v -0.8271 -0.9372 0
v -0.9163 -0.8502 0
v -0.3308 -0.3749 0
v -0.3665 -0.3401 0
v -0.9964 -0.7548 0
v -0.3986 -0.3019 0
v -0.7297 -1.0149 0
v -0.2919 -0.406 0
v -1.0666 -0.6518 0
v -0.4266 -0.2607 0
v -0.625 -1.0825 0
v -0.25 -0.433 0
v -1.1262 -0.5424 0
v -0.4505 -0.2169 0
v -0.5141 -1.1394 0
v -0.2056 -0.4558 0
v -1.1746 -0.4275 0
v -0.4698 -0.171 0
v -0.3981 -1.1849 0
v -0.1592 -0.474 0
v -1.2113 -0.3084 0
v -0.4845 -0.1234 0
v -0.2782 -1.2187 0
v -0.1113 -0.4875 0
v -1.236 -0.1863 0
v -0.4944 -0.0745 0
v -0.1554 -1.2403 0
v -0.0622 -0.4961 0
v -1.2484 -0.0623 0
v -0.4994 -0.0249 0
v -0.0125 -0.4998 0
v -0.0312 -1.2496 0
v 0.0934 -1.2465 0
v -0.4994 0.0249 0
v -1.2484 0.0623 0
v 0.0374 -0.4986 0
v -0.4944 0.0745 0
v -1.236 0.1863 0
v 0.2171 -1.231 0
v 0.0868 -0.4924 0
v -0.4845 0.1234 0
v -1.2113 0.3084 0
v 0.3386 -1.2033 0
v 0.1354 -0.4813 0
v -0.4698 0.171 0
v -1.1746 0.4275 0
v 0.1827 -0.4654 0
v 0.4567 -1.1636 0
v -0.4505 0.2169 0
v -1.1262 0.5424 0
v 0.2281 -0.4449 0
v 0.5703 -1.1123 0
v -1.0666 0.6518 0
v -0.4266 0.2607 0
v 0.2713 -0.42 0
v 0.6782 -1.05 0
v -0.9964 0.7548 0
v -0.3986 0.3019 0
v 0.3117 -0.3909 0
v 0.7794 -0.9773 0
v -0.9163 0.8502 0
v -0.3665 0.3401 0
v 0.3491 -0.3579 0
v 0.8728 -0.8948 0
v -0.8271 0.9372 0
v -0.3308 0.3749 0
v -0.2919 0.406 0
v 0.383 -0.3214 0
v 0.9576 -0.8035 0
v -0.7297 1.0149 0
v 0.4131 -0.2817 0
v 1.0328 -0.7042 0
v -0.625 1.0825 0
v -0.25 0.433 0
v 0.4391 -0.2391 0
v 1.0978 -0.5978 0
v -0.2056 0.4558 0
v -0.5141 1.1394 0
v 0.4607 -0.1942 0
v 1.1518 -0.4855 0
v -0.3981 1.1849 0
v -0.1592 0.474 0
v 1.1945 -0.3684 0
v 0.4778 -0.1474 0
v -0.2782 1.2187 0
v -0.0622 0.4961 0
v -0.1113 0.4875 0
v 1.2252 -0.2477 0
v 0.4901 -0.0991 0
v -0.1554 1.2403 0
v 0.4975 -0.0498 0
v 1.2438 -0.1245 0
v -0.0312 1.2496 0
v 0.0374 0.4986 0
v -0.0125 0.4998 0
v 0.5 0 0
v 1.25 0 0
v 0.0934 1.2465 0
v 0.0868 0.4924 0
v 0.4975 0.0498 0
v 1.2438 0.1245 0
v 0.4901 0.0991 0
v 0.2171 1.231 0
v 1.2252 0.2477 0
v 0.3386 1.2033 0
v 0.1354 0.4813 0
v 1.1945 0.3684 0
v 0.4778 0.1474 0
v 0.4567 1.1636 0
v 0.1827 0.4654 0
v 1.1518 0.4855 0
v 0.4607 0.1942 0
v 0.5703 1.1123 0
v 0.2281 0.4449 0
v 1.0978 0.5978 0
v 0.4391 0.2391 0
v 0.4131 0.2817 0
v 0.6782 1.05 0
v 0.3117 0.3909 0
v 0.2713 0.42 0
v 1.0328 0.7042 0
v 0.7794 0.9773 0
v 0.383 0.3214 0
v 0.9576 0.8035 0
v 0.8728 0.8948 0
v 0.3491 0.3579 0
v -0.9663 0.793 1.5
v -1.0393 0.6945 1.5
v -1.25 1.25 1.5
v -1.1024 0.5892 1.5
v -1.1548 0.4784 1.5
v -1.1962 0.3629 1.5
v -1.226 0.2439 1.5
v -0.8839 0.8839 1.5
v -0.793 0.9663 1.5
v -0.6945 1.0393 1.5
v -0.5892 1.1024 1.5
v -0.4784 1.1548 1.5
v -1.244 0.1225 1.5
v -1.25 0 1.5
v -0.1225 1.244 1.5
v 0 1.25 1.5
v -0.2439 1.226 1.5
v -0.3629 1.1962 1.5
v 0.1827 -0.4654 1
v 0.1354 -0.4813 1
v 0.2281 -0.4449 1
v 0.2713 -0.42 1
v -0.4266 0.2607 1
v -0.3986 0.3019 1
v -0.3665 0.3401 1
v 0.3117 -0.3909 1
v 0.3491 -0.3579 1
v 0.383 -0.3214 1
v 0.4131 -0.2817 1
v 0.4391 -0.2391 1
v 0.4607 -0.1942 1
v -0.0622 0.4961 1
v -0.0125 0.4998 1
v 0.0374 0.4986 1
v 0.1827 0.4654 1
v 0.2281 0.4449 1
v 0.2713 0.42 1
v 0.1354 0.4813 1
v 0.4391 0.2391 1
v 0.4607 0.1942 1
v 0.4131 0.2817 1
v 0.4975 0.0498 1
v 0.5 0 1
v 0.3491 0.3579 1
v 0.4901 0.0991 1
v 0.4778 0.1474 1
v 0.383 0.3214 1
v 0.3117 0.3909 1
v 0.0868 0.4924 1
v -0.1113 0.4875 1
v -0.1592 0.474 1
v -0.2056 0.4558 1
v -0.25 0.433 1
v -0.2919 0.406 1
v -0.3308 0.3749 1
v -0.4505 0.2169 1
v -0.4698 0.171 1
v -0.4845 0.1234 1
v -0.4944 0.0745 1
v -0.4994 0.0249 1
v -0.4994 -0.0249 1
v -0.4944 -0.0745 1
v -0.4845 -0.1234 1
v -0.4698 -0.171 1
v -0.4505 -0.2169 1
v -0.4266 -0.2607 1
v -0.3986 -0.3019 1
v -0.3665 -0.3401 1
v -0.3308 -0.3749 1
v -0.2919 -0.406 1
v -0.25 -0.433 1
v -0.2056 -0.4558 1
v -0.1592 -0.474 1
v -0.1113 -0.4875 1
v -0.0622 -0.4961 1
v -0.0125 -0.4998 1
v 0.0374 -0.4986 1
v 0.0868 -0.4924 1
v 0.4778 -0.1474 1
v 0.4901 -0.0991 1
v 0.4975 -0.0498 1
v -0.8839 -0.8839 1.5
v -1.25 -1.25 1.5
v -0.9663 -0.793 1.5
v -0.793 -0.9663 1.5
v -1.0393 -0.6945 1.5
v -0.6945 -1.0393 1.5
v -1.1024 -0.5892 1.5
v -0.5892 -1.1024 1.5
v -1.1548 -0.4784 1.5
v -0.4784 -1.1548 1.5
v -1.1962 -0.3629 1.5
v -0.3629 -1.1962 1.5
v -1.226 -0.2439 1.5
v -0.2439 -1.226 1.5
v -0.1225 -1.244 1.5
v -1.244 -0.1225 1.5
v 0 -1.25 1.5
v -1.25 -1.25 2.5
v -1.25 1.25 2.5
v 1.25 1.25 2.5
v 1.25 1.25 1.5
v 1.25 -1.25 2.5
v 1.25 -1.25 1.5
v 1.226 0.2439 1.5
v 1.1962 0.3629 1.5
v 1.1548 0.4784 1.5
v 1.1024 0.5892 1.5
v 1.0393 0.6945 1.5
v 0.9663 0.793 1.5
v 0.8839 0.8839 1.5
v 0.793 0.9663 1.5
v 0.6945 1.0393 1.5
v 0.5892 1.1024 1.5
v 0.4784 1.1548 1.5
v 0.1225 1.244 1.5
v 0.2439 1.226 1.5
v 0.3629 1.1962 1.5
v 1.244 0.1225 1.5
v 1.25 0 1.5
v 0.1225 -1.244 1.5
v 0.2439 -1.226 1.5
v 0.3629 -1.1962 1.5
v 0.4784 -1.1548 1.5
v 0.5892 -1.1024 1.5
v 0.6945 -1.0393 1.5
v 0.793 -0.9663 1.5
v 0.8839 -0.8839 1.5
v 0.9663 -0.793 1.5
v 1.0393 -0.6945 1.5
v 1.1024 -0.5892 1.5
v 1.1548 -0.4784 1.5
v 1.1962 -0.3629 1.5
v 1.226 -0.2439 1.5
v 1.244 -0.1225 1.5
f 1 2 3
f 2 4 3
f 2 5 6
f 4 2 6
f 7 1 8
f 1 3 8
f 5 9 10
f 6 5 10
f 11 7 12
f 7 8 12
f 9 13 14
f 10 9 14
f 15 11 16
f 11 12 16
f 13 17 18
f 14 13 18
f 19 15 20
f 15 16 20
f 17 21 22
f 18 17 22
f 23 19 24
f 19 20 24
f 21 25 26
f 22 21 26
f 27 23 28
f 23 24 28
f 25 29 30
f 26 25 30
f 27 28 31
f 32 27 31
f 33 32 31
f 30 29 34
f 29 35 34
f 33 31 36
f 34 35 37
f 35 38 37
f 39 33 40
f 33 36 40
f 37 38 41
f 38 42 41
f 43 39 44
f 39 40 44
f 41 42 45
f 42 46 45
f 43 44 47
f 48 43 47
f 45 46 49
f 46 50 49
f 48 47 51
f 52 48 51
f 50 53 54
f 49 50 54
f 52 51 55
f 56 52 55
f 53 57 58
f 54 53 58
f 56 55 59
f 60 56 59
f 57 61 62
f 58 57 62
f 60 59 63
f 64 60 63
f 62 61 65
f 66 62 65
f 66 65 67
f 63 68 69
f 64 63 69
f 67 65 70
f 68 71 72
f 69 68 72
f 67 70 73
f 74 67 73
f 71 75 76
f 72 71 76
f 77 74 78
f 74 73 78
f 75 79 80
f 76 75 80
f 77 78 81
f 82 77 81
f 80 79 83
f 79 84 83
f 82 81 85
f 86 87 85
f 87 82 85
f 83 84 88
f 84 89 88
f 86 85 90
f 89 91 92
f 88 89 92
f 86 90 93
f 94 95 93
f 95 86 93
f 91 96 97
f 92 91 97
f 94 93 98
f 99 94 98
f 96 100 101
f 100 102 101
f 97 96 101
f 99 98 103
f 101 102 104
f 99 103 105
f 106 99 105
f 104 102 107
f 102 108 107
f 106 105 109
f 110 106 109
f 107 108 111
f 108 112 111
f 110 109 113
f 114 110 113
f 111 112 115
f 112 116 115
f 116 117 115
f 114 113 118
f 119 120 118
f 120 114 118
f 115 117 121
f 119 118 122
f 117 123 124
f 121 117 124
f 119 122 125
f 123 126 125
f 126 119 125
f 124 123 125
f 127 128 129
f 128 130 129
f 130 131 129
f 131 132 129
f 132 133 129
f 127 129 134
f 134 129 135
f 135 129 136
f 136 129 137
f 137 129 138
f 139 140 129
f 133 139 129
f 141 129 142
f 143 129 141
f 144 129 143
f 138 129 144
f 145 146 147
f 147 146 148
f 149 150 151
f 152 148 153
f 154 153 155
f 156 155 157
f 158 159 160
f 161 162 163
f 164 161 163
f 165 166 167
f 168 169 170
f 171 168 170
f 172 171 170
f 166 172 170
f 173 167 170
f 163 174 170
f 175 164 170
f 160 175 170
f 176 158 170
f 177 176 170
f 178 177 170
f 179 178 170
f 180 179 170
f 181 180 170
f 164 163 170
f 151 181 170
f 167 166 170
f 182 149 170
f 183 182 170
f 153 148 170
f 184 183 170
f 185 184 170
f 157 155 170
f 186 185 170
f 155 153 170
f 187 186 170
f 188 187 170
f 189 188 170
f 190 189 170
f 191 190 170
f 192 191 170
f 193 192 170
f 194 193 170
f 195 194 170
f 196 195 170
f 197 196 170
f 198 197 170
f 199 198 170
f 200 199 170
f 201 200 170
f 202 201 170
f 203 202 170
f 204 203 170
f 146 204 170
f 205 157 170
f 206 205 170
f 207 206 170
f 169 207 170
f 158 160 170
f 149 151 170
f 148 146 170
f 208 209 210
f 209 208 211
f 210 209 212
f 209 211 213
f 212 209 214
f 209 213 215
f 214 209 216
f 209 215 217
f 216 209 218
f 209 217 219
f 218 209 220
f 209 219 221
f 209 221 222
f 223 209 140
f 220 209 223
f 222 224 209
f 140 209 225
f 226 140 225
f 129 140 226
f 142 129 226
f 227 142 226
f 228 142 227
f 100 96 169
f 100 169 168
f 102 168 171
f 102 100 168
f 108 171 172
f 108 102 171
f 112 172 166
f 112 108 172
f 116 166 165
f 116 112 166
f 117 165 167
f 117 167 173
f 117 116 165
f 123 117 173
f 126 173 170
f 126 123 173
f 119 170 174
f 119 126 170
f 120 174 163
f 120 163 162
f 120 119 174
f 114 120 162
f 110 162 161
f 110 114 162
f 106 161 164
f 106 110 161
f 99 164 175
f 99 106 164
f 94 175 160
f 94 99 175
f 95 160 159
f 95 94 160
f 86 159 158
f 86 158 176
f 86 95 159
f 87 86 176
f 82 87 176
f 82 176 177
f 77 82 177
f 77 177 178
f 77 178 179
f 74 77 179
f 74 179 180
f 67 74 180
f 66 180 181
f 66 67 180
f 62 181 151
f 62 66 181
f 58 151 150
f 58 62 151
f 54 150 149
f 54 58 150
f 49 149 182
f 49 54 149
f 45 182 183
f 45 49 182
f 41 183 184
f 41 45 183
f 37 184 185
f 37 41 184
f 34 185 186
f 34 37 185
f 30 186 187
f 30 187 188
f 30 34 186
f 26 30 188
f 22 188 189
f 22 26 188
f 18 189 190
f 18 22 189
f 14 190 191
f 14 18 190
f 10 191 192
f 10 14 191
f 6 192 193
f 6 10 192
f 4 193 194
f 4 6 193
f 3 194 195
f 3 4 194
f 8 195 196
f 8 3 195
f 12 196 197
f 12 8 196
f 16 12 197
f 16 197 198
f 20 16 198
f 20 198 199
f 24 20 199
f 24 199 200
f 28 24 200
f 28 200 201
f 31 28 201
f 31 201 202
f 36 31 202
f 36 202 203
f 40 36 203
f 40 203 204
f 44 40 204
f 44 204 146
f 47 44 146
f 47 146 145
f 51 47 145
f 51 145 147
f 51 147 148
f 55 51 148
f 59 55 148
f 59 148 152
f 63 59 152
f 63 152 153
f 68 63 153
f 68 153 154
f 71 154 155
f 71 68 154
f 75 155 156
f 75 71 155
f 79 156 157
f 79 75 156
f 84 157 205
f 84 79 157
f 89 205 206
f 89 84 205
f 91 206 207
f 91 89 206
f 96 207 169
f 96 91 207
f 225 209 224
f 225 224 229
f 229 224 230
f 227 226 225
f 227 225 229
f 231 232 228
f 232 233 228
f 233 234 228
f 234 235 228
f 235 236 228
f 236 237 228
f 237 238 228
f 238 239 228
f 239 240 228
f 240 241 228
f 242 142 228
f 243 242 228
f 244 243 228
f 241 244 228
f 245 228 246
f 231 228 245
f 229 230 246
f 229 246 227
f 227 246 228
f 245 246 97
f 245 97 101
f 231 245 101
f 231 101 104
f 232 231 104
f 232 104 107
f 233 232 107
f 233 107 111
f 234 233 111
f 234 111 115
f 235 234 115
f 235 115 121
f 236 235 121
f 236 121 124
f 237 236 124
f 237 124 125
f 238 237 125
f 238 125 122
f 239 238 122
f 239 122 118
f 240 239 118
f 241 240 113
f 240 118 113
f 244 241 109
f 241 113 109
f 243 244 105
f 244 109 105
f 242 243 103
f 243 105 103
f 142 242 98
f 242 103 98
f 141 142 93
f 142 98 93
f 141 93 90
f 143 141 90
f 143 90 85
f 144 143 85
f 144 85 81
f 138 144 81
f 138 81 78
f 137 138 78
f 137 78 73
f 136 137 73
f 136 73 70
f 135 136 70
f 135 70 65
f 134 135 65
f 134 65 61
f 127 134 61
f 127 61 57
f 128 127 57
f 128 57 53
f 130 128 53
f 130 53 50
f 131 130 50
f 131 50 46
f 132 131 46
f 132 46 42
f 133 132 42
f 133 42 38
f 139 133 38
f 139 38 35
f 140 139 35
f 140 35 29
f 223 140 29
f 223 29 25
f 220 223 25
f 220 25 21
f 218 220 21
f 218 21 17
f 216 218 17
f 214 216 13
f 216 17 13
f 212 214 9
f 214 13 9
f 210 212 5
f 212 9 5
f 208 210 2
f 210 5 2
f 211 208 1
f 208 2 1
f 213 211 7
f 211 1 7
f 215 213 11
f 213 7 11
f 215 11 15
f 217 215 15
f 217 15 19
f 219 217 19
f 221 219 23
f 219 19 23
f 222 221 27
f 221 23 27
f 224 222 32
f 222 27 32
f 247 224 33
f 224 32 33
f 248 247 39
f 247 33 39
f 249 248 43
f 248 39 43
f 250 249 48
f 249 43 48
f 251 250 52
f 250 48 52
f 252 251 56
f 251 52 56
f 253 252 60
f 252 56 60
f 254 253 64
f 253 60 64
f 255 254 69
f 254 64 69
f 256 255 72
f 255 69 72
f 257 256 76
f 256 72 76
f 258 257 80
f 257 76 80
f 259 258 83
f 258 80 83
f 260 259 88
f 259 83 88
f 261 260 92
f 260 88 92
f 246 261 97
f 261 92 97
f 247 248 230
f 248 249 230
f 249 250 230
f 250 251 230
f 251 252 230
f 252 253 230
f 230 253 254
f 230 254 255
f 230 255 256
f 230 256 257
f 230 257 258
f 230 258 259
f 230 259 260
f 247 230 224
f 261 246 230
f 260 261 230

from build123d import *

# Parameters (mm, degrees)
SKETCH1_R           = 1.25
BOSS_EXTRUDE1_DEPTH = 1.5
SKETCH1_4_R         = 0.5
CUT_EXTRUDE1_DEPTH  = 1
SKETCH2_W           = 2.5
SKETCH2_H           = 2.5
BOSS_EXTRUDE2_DEPTH = 1


with BuildPart() as part:
    # Sketch1 → Boss-Extrude1 (new body)
    with BuildSketch(Plane.XY):
        Circle(SKETCH1_R)
    extrude(amount=BOSS_EXTRUDE1_DEPTH)

    # Sketch1<4> → Cut-Extrude1 (cut)
    with BuildSketch(Plane.XY):
        Circle(SKETCH1_4_R)
    extrude(amount=CUT_EXTRUDE1_DEPTH, mode=Mode.SUBTRACT)

    # Sketch2 → Boss-Extrude2 (add)
    with BuildSketch(Plane.XY.offset(1.5)):
        Rectangle(SKETCH2_W, SKETCH2_H)
    extrude(amount=BOSS_EXTRUDE2_DEPTH)


solid = part.part
